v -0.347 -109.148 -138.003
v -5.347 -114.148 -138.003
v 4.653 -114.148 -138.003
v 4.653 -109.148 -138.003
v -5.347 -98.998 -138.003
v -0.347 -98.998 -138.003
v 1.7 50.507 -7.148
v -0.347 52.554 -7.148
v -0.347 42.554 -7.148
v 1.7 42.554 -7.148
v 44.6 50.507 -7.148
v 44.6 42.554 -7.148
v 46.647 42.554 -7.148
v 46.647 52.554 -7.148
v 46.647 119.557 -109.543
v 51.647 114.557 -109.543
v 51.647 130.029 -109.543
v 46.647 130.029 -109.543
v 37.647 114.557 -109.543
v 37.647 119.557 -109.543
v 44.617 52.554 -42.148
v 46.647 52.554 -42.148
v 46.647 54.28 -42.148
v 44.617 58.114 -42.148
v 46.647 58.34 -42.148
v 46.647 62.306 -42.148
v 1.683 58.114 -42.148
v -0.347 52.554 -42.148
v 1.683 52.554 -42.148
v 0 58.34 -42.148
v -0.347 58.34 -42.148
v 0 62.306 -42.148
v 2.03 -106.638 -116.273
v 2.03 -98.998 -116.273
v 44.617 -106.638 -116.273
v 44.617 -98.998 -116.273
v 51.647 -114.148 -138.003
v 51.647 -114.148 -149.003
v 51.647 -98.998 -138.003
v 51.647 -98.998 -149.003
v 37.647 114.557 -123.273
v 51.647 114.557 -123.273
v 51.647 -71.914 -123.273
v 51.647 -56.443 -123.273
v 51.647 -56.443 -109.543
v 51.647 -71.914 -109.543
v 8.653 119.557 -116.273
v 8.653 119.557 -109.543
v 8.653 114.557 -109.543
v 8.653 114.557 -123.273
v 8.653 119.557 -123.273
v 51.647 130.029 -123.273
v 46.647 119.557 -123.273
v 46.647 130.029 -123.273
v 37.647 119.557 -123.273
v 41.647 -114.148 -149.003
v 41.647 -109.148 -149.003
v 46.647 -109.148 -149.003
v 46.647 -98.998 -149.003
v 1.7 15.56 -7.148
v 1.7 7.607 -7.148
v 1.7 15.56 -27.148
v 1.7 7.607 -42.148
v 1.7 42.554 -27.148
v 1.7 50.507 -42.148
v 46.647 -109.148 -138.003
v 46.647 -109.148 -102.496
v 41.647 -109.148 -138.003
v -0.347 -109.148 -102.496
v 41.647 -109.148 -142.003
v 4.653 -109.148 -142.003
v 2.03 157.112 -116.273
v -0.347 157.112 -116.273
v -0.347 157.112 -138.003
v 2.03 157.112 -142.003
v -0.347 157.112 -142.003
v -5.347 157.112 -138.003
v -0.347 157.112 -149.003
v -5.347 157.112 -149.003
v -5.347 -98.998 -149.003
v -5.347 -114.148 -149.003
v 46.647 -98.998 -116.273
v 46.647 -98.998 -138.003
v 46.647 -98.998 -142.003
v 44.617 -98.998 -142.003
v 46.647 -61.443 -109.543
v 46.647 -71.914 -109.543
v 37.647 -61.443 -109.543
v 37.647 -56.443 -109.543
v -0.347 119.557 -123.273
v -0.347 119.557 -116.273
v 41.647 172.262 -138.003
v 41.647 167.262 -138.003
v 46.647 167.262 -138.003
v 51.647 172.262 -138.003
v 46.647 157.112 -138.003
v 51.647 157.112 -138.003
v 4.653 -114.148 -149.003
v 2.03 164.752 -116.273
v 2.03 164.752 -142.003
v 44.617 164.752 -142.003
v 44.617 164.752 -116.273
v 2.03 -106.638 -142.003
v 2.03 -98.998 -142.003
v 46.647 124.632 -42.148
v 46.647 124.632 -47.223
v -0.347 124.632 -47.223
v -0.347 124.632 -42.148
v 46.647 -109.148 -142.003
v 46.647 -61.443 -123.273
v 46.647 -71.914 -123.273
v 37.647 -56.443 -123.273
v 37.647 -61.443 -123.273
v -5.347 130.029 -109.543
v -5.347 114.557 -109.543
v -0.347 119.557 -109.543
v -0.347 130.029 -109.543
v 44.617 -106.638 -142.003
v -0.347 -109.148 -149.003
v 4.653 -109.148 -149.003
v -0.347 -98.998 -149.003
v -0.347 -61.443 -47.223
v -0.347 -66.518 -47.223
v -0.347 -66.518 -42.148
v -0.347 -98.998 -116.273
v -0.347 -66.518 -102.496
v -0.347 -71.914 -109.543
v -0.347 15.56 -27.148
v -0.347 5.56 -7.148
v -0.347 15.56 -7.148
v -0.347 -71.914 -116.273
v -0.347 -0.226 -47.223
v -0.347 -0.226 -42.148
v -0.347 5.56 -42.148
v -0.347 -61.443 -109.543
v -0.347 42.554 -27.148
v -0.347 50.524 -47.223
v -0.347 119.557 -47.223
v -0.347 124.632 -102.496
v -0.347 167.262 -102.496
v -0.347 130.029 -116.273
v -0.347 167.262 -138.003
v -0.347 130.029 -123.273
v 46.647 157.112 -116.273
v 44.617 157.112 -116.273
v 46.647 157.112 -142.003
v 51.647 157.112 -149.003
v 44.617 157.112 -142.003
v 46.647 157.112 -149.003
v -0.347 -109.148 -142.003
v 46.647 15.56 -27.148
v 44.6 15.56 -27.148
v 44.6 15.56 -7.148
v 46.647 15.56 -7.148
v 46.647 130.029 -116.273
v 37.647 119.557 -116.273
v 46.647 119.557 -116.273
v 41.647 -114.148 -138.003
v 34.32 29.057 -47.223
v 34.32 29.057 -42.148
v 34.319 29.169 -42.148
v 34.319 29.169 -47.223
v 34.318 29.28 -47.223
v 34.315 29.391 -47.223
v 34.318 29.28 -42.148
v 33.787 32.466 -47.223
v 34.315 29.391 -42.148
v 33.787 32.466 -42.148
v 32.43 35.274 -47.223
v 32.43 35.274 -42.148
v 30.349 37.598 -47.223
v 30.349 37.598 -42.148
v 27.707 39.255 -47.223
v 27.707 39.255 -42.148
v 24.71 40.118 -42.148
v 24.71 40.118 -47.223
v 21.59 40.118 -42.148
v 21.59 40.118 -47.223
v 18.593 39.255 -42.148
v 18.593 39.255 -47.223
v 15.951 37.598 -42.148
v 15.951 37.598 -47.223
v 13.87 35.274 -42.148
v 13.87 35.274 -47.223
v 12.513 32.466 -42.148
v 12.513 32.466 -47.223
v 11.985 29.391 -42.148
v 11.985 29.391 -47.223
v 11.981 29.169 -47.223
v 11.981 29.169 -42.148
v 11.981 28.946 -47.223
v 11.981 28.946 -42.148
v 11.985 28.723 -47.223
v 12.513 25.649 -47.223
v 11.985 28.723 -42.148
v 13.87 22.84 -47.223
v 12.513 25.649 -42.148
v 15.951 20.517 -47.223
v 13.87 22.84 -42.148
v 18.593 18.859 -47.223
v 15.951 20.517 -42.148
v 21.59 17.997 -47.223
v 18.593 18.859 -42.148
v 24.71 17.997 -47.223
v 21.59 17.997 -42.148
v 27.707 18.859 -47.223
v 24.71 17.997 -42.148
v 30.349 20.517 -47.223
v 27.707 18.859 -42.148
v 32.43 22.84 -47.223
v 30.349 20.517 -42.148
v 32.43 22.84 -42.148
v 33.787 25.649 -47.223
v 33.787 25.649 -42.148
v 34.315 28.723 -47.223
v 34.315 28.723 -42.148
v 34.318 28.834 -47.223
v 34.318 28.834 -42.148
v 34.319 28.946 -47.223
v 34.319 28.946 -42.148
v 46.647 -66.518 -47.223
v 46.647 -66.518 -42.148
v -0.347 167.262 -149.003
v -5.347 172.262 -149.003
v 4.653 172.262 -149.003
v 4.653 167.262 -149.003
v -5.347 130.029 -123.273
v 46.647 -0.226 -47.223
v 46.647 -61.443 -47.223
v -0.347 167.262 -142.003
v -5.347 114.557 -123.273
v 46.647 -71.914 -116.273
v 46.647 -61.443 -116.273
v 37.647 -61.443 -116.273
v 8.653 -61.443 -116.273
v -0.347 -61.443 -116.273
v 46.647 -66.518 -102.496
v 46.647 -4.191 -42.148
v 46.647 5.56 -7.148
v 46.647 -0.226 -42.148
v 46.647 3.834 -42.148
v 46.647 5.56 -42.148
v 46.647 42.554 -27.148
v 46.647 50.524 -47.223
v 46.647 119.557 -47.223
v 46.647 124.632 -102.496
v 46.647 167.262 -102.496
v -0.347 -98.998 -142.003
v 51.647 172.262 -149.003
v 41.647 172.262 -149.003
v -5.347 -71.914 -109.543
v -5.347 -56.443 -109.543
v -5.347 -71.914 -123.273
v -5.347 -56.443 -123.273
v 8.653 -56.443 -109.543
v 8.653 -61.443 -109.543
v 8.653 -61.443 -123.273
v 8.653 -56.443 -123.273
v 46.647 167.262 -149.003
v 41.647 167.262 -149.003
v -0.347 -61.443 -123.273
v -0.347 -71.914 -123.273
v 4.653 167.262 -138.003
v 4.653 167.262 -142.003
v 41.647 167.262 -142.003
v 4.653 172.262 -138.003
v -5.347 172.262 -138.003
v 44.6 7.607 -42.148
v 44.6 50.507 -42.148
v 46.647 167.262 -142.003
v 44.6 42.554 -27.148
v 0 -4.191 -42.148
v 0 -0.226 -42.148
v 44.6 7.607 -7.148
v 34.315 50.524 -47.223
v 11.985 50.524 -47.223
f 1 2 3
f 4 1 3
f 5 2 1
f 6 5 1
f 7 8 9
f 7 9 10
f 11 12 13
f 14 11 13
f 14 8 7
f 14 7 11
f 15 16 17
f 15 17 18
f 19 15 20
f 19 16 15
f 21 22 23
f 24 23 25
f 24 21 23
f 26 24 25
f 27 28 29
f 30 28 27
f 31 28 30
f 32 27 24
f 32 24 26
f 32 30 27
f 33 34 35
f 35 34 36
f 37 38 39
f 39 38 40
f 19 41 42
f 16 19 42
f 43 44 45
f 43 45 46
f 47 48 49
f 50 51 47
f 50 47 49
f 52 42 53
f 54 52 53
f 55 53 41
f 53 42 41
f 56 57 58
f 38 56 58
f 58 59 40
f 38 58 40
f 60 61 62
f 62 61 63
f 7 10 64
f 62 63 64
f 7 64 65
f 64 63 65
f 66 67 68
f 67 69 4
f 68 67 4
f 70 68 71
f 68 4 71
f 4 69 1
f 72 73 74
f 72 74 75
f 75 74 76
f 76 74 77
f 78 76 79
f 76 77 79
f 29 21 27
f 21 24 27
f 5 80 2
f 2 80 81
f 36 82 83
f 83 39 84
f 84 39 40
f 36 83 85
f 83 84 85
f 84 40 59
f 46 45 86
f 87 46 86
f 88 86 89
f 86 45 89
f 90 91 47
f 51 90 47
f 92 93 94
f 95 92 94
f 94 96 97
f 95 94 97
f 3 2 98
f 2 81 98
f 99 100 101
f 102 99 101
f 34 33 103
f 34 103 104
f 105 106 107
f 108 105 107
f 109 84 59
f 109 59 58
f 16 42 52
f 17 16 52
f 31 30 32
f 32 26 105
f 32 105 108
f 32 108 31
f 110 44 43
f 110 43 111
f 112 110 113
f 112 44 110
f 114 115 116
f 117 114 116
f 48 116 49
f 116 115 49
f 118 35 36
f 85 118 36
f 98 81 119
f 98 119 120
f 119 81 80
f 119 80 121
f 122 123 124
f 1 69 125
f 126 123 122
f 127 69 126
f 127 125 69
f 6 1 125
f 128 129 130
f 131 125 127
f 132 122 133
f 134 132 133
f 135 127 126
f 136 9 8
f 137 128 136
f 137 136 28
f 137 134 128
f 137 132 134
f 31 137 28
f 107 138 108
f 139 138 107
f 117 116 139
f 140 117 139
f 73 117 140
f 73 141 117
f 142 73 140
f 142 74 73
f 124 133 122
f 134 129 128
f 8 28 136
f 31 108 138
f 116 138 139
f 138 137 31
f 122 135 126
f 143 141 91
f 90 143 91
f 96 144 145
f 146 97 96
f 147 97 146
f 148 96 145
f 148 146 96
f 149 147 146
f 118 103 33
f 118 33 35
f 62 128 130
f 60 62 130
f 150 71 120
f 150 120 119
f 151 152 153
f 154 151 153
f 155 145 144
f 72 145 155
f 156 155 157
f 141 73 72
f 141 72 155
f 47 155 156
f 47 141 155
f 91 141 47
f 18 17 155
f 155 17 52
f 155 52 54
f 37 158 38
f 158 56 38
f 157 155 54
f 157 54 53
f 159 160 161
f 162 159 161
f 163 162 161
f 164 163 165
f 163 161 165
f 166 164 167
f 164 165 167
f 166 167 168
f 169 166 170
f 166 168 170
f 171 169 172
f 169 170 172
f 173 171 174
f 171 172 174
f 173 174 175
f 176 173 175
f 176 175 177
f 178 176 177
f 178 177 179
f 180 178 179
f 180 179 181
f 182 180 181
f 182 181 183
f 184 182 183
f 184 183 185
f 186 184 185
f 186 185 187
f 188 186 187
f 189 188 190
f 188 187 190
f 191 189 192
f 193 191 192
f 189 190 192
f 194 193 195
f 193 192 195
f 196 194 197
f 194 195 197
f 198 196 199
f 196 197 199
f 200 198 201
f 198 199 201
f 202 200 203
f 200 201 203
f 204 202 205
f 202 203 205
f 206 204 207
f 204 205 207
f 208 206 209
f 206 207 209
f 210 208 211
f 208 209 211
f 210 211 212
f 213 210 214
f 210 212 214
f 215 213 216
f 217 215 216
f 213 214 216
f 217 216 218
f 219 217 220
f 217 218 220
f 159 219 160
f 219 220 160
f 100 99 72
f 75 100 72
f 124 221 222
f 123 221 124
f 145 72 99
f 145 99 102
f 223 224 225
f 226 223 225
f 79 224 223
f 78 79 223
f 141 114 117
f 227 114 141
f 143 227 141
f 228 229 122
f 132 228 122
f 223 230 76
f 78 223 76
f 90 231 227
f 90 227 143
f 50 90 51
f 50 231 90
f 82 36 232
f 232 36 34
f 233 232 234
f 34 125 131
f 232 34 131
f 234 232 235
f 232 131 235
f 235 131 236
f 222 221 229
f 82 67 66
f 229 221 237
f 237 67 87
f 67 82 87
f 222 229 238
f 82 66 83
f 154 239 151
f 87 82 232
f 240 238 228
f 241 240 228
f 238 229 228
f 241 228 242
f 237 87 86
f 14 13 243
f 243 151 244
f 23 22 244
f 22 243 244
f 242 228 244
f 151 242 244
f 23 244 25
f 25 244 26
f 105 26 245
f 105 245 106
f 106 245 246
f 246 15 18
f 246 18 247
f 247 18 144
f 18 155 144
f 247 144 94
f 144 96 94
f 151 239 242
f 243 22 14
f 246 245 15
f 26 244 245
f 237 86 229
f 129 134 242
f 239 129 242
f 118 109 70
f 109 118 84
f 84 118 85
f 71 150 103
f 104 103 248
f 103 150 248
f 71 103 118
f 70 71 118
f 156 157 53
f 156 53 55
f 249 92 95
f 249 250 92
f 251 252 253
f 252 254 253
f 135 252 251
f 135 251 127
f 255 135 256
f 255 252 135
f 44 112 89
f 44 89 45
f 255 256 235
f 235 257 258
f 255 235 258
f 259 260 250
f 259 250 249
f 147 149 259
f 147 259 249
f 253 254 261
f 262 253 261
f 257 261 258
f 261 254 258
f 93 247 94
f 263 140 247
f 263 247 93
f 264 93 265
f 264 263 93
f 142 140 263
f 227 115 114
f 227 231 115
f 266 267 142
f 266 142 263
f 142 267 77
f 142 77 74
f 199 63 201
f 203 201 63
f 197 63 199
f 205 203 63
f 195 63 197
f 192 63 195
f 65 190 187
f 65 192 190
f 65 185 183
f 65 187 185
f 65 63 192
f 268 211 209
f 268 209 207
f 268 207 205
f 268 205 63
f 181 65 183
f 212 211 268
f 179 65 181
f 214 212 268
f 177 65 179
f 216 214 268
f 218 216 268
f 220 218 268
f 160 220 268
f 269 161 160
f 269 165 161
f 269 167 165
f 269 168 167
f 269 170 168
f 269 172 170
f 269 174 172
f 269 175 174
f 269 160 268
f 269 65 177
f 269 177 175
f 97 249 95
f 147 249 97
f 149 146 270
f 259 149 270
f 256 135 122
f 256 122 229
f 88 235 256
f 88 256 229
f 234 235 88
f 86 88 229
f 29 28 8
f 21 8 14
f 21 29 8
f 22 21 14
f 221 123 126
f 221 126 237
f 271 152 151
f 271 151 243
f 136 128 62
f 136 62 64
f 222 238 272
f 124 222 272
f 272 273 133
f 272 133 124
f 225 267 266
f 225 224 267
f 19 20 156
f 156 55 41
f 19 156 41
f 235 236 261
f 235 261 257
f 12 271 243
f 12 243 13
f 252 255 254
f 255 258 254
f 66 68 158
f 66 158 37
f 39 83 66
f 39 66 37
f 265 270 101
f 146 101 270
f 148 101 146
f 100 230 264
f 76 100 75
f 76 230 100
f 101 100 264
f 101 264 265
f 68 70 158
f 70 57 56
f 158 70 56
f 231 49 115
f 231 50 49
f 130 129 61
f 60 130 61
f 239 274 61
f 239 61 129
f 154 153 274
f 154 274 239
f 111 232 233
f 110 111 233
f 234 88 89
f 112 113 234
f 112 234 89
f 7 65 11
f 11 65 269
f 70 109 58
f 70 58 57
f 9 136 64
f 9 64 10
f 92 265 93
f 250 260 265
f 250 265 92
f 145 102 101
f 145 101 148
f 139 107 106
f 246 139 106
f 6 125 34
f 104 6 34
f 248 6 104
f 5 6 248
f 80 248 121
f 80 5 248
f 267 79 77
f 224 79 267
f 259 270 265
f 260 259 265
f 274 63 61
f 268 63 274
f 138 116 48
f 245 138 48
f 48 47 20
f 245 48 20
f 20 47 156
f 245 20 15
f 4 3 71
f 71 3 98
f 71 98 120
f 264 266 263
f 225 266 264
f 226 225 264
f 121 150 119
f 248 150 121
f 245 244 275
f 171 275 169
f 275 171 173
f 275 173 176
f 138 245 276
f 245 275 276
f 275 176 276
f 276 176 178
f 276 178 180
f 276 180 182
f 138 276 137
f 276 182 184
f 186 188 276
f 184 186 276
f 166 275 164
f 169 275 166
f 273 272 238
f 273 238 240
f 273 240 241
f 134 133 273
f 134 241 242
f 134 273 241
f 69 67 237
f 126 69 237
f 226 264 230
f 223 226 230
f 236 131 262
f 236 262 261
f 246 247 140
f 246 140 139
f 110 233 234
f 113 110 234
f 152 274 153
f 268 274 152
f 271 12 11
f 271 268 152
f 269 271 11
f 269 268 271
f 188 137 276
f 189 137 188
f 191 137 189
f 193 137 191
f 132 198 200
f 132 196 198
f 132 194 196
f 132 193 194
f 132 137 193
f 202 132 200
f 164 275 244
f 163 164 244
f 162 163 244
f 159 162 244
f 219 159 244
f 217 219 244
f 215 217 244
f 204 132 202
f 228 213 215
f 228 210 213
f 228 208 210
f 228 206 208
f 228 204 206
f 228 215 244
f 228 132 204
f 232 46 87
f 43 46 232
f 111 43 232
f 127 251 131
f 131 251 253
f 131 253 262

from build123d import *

# Parameters (mm, degrees)
SKETCH_1_W                = 46.3
SKETCH_1_H                = 47
EXTRUDE_1_DEPTH           = 50
SKETCH_2_W                = 46.3
SKETCH_2_H                = 42
CUT_EXTRUDE_1_DEPTH       = 32.3
SKETCH_3_W                = 42.3
SKETCH_3_H                = 40
CUT_EXTRUDE_2_DEPTH       = 10
SKETCH_4_W                = 42.3
SKETCH_4_H                = 37
CUT_EXTRUDE_3_DEPTH       = 8.7
SKETCH_5_W                = 2
SKETCH_5_H                = 22
SKETCH_5_W_2              = 26.3
SKETCH_5_H_2              = 2
CUT_EXTRUDE_4_DEPTH       = 5
SKETCH_7_W                = 10
SKETCH_7_H                = 5
EXTRUDE_2_DEPTH           = 2
SKETCH_8_W                = 10
SKETCH_8_H                = 5
EXTRUDE_3_DEPTH           = 2
SKETCH_9_W                = 22
SKETCH_9_H                = 21.15
CUT_EXTRUDE_5_DEPTH       = 6
SKETCH_11_R               = 2
EXTRUDE_4_DEPTH           = 4
SKETCH_12_R               = 2
CUT_EXTRUDE_6_DEPTH       = 4
SCALE_1_SCALE             = 1.015
SKETCH_13_W               = 33.453324454
SKETCH_13_H               = 20.869572599
CUT_EXTRUDE_7_DEPTH       = 57.79725
CUT_EXTRUDE_7_DEPTH_BACK  = 11.49725
EXTRUDE_START             = -47.22285
SKETCH_15_W               = 23.49725
SKETCH_15_H               = 95.575
EXTRUDE_5_DEPTH           = 5.075
SKETCH_16_R               = 11.165
CUT_EXTRUDE_9_DEPTH       = 1
CUT_EXTRUDE_9_DEPTH_BACK  = 48.222850293
SKETCH_17_W               = 23.49725
SKETCH_17_H               = 95.575
EXTRUDE_6_DEPTH           = 5.075
SKETCH_18_R               = 11.17
CUT_EXTRUDE_11_DEPTH      = 1
CUT_EXTRUDE_11_DEPTH_BACK = 48.222850293
EXTRUDE_START_2           = -42.14785
SKETCH_20_W               = 46.64725
SKETCH_20_H               = 4.191450632
EXTRUDE_7_DEPTH           = 10
EXTRUDE_START_3           = -66.517763
SKETCH_22_W               = 46.9945
SKETCH_22_H               = 69.05
EXTRUDE_8_DEPTH           = 5.075
SKETCH_24_W               = 13.7769009
SKETCH_24_H               = 42.63
EXTRUDE_10_DEPTH          = 46.9945
SKETCH_26_W               = 25.73
SKETCH_26_H               = 10.15
EXTRUDE_11_DEPTH          = 46.9945
CUT_EXTRUDE_START         = -142.00285
SKETCH_28_W               = 42.58725
SKETCH_28_H               = 7.64
CUT_EXTRUDE_13_DEPTH      = 25.73
EXTRUDE_12_DEPTH          = 7
EXTRUDE_12_2_DEPTH        = 7
EXTRUDE_14_DEPTH          = 7
EXTRUDE_14_2_DEPTH        = 7
EXTRUDE_15_DEPTH          = 4
EXTRUDE_16_DEPTH          = 6.73
SKETCH_31_W               = 24.506685575
SKETCH_31_H               = 120.544137908
CUT_EXTRUDE_14_DEPTH      = 11.15
CUT_EXTRUDE_14_DEPTH_BACK = 58.1445
SKETCH_34_W               = 46.9945
SKETCH_34_H               = 46.9945
EXTRUDE_17_DEPTH          = 35
SKETCH_33_W               = 42.9
SKETCH_33_H               = 42.9
CUT_EXTRUDE_15_DEPTH      = 35
SKETCH_35_W               = 20
SKETCH_35_H               = 26.9945
CUT_EXTRUDE_16_DEPTH      = 6
CUT_EXTRUDE_16_DEPTH_BACK = 52.9945


with BuildPart() as part:
    # 草圖1 → 填料-伸長1 (new body)
    with BuildSketch(Plane(origin=(0, 0, 0), x_dir=(1, 0, 0), z_dir=(0, 1, 0))):
        with Locations((23.15, 23.5)):
            Rectangle(SKETCH_1_W, SKETCH_1_H)
    extrude(amount=EXTRUDE_1_DEPTH)

    # 草圖2 → 除料-伸長1 (cut)
    with BuildSketch(Plane(origin=(0, 50, 0), x_dir=(1, 0, 0), z_dir=(0, 1, 0))):
        with Locations((23.15, 21)):
            Rectangle(SKETCH_2_W, SKETCH_2_H)
    extrude(amount=-CUT_EXTRUDE_1_DEPTH, mode=Mode.SUBTRACT)

    # 草圖3 → 除料-伸長2 (cut)
    with BuildSketch(Plane(origin=(0, 17.7, 0), x_dir=(1, 0, 0), z_dir=(0, 1, 0))):
        with Locations((23.15, 22)):
            Rectangle(SKETCH_3_W, SKETCH_3_H)
    extrude(amount=-CUT_EXTRUDE_2_DEPTH, mode=Mode.SUBTRACT)

    # 草圖4 → 除料-伸長3 (cut, through all)
    with BuildSketch(Plane(origin=(0, 7.7, 0), x_dir=(1, 0, 0), z_dir=(0, 1, 0))):
        with Locations((23.15, 23.5)):
            Rectangle(SKETCH_4_W, SKETCH_4_H)
    extrude(amount=-CUT_EXTRUDE_3_DEPTH, mode=Mode.SUBTRACT)

    # 草圖5 → 除料-伸長4 (cut)
    with BuildSketch(Plane(origin=(0, 17.7, 0), x_dir=(1, 0, 0), z_dir=(0, 1, 0))):
        with Locations((1, 21)):
            Rectangle(SKETCH_5_W, SKETCH_5_H)
        with Locations((45.3, 21)):
            Rectangle(SKETCH_5_W, SKETCH_5_H)
        with Locations((23.15, 1)):
            Rectangle(SKETCH_5_W_2, SKETCH_5_H_2)
    extrude(amount=-CUT_EXTRUDE_4_DEPTH, mode=Mode.SUBTRACT)

    # 草圖7 → 填料-伸長2 (add)
    with BuildSketch(Plane.ZY):
        with BuildLine():
            Line((-42, 32.7), (-42, 22.7))
            Line((-42, 22.7), (-32, 22.7))
            ThreePointArc((-32, 22.7), (-34.928932188, 29.771067812), (-42, 32.7))
        make_face()
        with Locations((-37, 20.2)):
            Rectangle(SKETCH_7_W, SKETCH_7_H)
    extrude(amount=-EXTRUDE_2_DEPTH)

    # 草圖8 → 填料-伸長3 (add)
    with BuildSketch(Plane(origin=(46.3, 0, 0), x_dir=(0, 0, -1), z_dir=(1, 0, 0))):
        with Locations((37, 20.2)):
            Rectangle(SKETCH_8_W, SKETCH_8_H)
        with BuildLine():
            Line((32, 22.7), (42, 22.7))
            Line((42, 22.7), (42, 32.7))
            ThreePointArc((42, 32.7), (34.928932188, 29.771067812), (32, 22.7))
        make_face()
    extrude(amount=-EXTRUDE_3_DEPTH)

    # 草圖9 → 除料-伸長5 (cut, through all)
    with BuildSketch(Plane.XY.offset(-42)):
        with BuildLine():
            ThreePointArc((34.15, 28.85), (23.15, 17.85), (12.15, 28.85))
            Line((12.15, 28.85), (34.15, 28.85))
        make_face()
        with Locations((23.15, 39.425)):
            Rectangle(SKETCH_9_W, SKETCH_9_H)
    extrude(amount=-CUT_EXTRUDE_5_DEPTH, mode=Mode.SUBTRACT)

    # 草圖11 → 填料-伸長4 (add)
    with BuildSketch(Plane.XZ):
        with BuildLine():
            Line((51.3, -5), (46.3, -5))
            Line((46.3, -5), (46.3, -15))
            Line((46.3, -15), (51.3, -15))
            ThreePointArc((51.3, -15), (56.3, -10), (51.3, -5))
        make_face()
        with Locations((51.3, -10)):
            Circle(SKETCH_11_R, mode=Mode.SUBTRACT)
        with BuildLine():
            Line((46.3, -32), (46.3, -42))
            Line((46.3, -42), (51.3, -42))
            ThreePointArc((51.3, -42), (56.3, -37), (51.3, -32))
            Line((51.3, -32), (46.3, -32))
        make_face()
        with Locations((51.3, -37)):
            Circle(SKETCH_11_R, mode=Mode.SUBTRACT)
        with BuildLine():
            Line((0, -15), (0, -5))
            Line((0, -5), (-5, -5))
            ThreePointArc((-5, -5), (-10, -10), (-5, -15))
            Line((-5, -15), (0, -15))
        make_face()
        with BuildLine():
            Line((0, -42), (0, -32))
            Line((0, -32), (-5, -32))
            ThreePointArc((-5, -32), (-10, -37), (-5, -42))
            Line((-5, -42), (0, -42))
        make_face()
        with Locations((-5, -37)):
            Circle(SKETCH_11_R, mode=Mode.SUBTRACT)
    extrude(amount=-EXTRUDE_4_DEPTH)

    # 草圖12 → 除料-伸長6 (cut)
    with BuildSketch(Plane.XZ):
        with Locations((-5, -10)):
            Circle(SKETCH_12_R)
    extrude(amount=-CUT_EXTRUDE_6_DEPTH, mode=Mode.SUBTRACT)


with BuildPart() as part_1:
    # 縮放比例1: scaled about (23.15, 15.034187995, -32.143313771)
    add(part.part.scale(SCALE_1_SCALE).moved(Location((-0.34725, -0.22551282, 0.482149707))))

    # 草圖13 → 除料-伸長7 (cut, two sides)
    with BuildSketch(Plane(origin=(0, 0, 0), x_dir=(0, 0, -1), z_dir=(1, 0, 0))) as cut_extrude_7_sk:
        with Locations((15.271188066, 10.20927348)):
            Rectangle(SKETCH_13_W, SKETCH_13_H)
    extrude(amount=CUT_EXTRUDE_7_DEPTH, mode=Mode.SUBTRACT)
    extrude(cut_extrude_7_sk.sketch, amount=-CUT_EXTRUDE_7_DEPTH_BACK, mode=Mode.SUBTRACT)

    # 草圖15 → 填料-伸長5 (add)
    with BuildSketch(Plane.XY.offset(EXTRUDE_START)):
        with Locations((34.898625, 76.84473718)):
            Rectangle(SKETCH_15_W, SKETCH_15_H)
    extrude_5 = extrude(amount=EXTRUDE_5_DEPTH)

    # 鏡射1: 填料-伸長5 across plane
    add(extrude_5.mirror(Plane(origin=(23.15, 50.52448718, 56.273191067), x_dir=(0, 0, 1), z_dir=(1, 0, 0))))

    # 草圖16 → 除料-伸長9 (cut, two sides)
    with BuildSketch(Plane.XY) as cut_extrude_9_sk:
        with Locations((23.15, 29.05723718)):
            Circle(SKETCH_16_R)
    extrude(amount=CUT_EXTRUDE_9_DEPTH, mode=Mode.SUBTRACT)
    extrude(cut_extrude_9_sk.sketch, amount=-CUT_EXTRUDE_9_DEPTH_BACK, mode=Mode.SUBTRACT)

    # 草圖17 → 填料-伸長6 (add)
    with BuildSketch(Plane.XY.offset(EXTRUDE_START)):
        with Locations((11.401375, -18.73026282)):
            Rectangle(SKETCH_17_W, SKETCH_17_H)
    extrude_6 = extrude(amount=EXTRUDE_6_DEPTH)

    # 鏡射2: 填料-伸長6 across plane
    add(extrude_6.mirror(Plane(origin=(23.15, 50.52448718, 56.273191067), x_dir=(0, 0, 1), z_dir=(-1, 0, 0))))

    # 草圖18 → 除料-伸長11 (cut, two sides)
    with BuildSketch(Plane.XY) as cut_extrude_11_sk:
        with Locations((23.15, 29.05723718)):
            Circle(SKETCH_18_R)
    extrude(amount=CUT_EXTRUDE_11_DEPTH, mode=Mode.SUBTRACT)
    extrude(cut_extrude_11_sk.sketch, amount=-CUT_EXTRUDE_11_DEPTH_BACK, mode=Mode.SUBTRACT)

    # 草圖20 → 填料-伸長7 (add)
    with BuildSketch(Plane.XY.offset(EXTRUDE_START_2)):
        with Locations((23.323625, -2.095725316)):
            Rectangle(SKETCH_20_W, SKETCH_20_H)
    extrude(amount=EXTRUDE_7_DEPTH)

    # 草圖22 → 填料-伸長8 (add)
    with BuildSketch(Plane(origin=(0, 0, 0), x_dir=(1, 0, 0), z_dir=(0, 1, 0)).offset(EXTRUDE_START_3)):
        with Locations((23.15, 81.747850293)):
            Rectangle(SKETCH_22_W, SKETCH_22_H)
    extrude(amount=EXTRUDE_8_DEPTH)

    # 草圖24 → 填料-伸長10 (add)
    with BuildSketch(Plane(origin=(-0.34725, 0, 0), x_dir=(0, 0, -1), z_dir=(1, 0, 0))):
        with Locations((109.384399843, -87.83276282)):
            Rectangle(SKETCH_24_W, SKETCH_24_H)
    extrude(amount=EXTRUDE_10_DEPTH)

    # 草圖26 → 填料-伸長11 (add)
    with BuildSketch(Plane(origin=(-0.34725, 0, 0), x_dir=(0, 0, -1), z_dir=(1, 0, 0))):
        with Locations((129.137850293, -104.07276282)):
            Rectangle(SKETCH_26_W, SKETCH_26_H)
    extrude(amount=EXTRUDE_11_DEPTH)

    # 草圖28 → 除料-伸長13 (cut)
    with BuildSketch(Plane.XY.offset(CUT_EXTRUDE_START)):
        with Locations((23.323625, -102.81776282)):
            Rectangle(SKETCH_28_W, SKETCH_28_H)
    extrude(amount=CUT_EXTRUDE_13_DEPTH, mode=Mode.SUBTRACT)



with BuildPart() as body_2:
    # 草圖29 → 填料-伸長12 (new body)
    with BuildSketch(Plane(origin=(0, 0, -116.272850293), x_dir=(-1, 0, 0), z_dir=(0, 0, -1))):
        Polygon((-37.64725, -61.44276282), (-37.64725, -56.44276282), (-51.64725, -56.44276282), (-51.64725, -71.914320692), (-46.64725, -71.914320692), (-46.64725, -61.44276282), align=None)
    extrude(amount=EXTRUDE_12_DEPTH)


with BuildPart() as body_3:
    # 草圖29 → Extrude 12 2 (new body)
    with BuildSketch(Plane(origin=(0, 0, -116.272850293), x_dir=(-1, 0, 0), z_dir=(0, 0, -1))):
        Polygon((-8.65275, -61.44276282), (-8.65275, -56.44276282), (5.34725, -56.44276282), (5.34725, -71.914320692), (0.34725, -71.914320692), (0.34725, -61.44276282), align=None)
    extrude(amount=EXTRUDE_12_2_DEPTH)


with BuildPart() as body_4:
    # 草圖30 → 填料-伸長14 (new body)
    with BuildSketch(Plane(origin=(0, 0, -142.002850293), x_dir=(-1, 0, 0), z_dir=(0, 0, -1))):
        Polygon((-41.64725, -109.14776282), (-41.64725, -114.14776282), (-51.64725, -114.14776282), (-51.64725, -98.99776282), (-46.64725, -98.99776282), (-46.64725, -109.14776282), align=None)
    extrude(amount=EXTRUDE_14_DEPTH)


with BuildPart() as body_5:
    # 草圖30 → Extrude 14 2 (new body)
    with BuildSketch(Plane(origin=(0, 0, -142.002850293), x_dir=(-1, 0, 0), z_dir=(0, 0, -1))):
        Polygon((-4.65275, -109.14776282), (0.34725, -109.14776282), (0.34725, -98.99776282), (5.34725, -98.99776282), (5.34725, -114.14776282), (-4.65275, -114.14776282), align=None)
    extrude(amount=EXTRUDE_14_2_DEPTH)


with BuildPart() as part_2:
    add(part_1.part)

    add(body_4.part)  # 填料-伸長15 merges body 4

    add(body_5.part)  # 填料-伸長15 merges body 5
    # 草圖30<2> → 填料-伸長15 (add)
    with BuildSketch(Plane(origin=(0, 0, -142.002850293), x_dir=(-1, 0, 0), z_dir=(0, 0, -1))):
        Polygon((-41.64725, -109.14776282), (-41.64725, -114.14776282), (-51.64725, -114.14776282), (-51.64725, -98.99776282), (-46.64725, -98.99776282), (-46.64725, -109.14776282), align=None)
        Polygon((-4.65275, -109.14776282), (0.34725, -109.14776282), (0.34725, -98.99776282), (5.34725, -98.99776282), (5.34725, -114.14776282), (-4.65275, -114.14776282), align=None)
    extrude(amount=-EXTRUDE_15_DEPTH)


    add(body_2.part)  # 填料-伸長16 merges body 2

    add(body_3.part)  # 填料-伸長16 merges body 3
    # 草圖29<5> → 填料-伸長16 (add)
    with BuildSketch(Plane(origin=(0, 0, -116.272850293), x_dir=(-1, 0, 0), z_dir=(0, 0, -1))):
        Polygon((-37.64725, -61.44276282), (-37.64725, -56.44276282), (-51.64725, -56.44276282), (-51.64725, -71.914320692), (-46.64725, -71.914320692), (-46.64725, -61.44276282), align=None)
        Polygon((-8.65275, -61.44276282), (-8.65275, -56.44276282), (5.34725, -56.44276282), (5.34725, -71.914320692), (0.34725, -71.914320692), (0.34725, -61.44276282), align=None)
    extrude(amount=-EXTRUDE_16_DEPTH)

    # 鏡射40: part across plane


with BuildPart() as part_3:
    add(part_2.part)
    add(part_2.part.mirror(Plane.ZX.offset(29.05723718)))

    # 草圖31 → 除料-伸長14 (cut, two sides)
    with BuildSketch(Plane.ZY.offset(0.34725)) as cut_extrude_14_sk:
        with Locations((-29.894507506, 20.212320412)):
            Rectangle(SKETCH_31_W, SKETCH_31_H)
    extrude(amount=CUT_EXTRUDE_14_DEPTH, mode=Mode.SUBTRACT)
    extrude(cut_extrude_14_sk.sketch, amount=-CUT_EXTRUDE_14_DEPTH_BACK, mode=Mode.SUBTRACT)

    # 草圖34 → 填料-伸長17 (add)
    with BuildSketch(Plane.XY.offset(-42.147850293)):
        with Locations((23.15, 29.05723718)):
            Rectangle(SKETCH_34_W, SKETCH_34_H)
    extrude(amount=EXTRUDE_17_DEPTH)

    # 草圖33 → 除料-伸長15 (cut)
    with BuildSketch(Plane.XY.offset(-42.147850293)):
        with Locations((23.15, 29.05723718)):
            Rectangle(SKETCH_33_W, SKETCH_33_H)
    extrude(amount=CUT_EXTRUDE_15_DEPTH, mode=Mode.SUBTRACT)

    # 草圖35 → 除料-伸長16 (cut, two sides)
    with BuildSketch(Plane.ZY.offset(0.34725)) as cut_extrude_16_sk:
        with Locations((-17.147850293, 29.05723718)):
            Rectangle(SKETCH_35_W, SKETCH_35_H)
    extrude(amount=CUT_EXTRUDE_16_DEPTH, mode=Mode.SUBTRACT)
    extrude(cut_extrude_16_sk.sketch, amount=-CUT_EXTRUDE_16_DEPTH_BACK, mode=Mode.SUBTRACT)


solid = part_3.part
